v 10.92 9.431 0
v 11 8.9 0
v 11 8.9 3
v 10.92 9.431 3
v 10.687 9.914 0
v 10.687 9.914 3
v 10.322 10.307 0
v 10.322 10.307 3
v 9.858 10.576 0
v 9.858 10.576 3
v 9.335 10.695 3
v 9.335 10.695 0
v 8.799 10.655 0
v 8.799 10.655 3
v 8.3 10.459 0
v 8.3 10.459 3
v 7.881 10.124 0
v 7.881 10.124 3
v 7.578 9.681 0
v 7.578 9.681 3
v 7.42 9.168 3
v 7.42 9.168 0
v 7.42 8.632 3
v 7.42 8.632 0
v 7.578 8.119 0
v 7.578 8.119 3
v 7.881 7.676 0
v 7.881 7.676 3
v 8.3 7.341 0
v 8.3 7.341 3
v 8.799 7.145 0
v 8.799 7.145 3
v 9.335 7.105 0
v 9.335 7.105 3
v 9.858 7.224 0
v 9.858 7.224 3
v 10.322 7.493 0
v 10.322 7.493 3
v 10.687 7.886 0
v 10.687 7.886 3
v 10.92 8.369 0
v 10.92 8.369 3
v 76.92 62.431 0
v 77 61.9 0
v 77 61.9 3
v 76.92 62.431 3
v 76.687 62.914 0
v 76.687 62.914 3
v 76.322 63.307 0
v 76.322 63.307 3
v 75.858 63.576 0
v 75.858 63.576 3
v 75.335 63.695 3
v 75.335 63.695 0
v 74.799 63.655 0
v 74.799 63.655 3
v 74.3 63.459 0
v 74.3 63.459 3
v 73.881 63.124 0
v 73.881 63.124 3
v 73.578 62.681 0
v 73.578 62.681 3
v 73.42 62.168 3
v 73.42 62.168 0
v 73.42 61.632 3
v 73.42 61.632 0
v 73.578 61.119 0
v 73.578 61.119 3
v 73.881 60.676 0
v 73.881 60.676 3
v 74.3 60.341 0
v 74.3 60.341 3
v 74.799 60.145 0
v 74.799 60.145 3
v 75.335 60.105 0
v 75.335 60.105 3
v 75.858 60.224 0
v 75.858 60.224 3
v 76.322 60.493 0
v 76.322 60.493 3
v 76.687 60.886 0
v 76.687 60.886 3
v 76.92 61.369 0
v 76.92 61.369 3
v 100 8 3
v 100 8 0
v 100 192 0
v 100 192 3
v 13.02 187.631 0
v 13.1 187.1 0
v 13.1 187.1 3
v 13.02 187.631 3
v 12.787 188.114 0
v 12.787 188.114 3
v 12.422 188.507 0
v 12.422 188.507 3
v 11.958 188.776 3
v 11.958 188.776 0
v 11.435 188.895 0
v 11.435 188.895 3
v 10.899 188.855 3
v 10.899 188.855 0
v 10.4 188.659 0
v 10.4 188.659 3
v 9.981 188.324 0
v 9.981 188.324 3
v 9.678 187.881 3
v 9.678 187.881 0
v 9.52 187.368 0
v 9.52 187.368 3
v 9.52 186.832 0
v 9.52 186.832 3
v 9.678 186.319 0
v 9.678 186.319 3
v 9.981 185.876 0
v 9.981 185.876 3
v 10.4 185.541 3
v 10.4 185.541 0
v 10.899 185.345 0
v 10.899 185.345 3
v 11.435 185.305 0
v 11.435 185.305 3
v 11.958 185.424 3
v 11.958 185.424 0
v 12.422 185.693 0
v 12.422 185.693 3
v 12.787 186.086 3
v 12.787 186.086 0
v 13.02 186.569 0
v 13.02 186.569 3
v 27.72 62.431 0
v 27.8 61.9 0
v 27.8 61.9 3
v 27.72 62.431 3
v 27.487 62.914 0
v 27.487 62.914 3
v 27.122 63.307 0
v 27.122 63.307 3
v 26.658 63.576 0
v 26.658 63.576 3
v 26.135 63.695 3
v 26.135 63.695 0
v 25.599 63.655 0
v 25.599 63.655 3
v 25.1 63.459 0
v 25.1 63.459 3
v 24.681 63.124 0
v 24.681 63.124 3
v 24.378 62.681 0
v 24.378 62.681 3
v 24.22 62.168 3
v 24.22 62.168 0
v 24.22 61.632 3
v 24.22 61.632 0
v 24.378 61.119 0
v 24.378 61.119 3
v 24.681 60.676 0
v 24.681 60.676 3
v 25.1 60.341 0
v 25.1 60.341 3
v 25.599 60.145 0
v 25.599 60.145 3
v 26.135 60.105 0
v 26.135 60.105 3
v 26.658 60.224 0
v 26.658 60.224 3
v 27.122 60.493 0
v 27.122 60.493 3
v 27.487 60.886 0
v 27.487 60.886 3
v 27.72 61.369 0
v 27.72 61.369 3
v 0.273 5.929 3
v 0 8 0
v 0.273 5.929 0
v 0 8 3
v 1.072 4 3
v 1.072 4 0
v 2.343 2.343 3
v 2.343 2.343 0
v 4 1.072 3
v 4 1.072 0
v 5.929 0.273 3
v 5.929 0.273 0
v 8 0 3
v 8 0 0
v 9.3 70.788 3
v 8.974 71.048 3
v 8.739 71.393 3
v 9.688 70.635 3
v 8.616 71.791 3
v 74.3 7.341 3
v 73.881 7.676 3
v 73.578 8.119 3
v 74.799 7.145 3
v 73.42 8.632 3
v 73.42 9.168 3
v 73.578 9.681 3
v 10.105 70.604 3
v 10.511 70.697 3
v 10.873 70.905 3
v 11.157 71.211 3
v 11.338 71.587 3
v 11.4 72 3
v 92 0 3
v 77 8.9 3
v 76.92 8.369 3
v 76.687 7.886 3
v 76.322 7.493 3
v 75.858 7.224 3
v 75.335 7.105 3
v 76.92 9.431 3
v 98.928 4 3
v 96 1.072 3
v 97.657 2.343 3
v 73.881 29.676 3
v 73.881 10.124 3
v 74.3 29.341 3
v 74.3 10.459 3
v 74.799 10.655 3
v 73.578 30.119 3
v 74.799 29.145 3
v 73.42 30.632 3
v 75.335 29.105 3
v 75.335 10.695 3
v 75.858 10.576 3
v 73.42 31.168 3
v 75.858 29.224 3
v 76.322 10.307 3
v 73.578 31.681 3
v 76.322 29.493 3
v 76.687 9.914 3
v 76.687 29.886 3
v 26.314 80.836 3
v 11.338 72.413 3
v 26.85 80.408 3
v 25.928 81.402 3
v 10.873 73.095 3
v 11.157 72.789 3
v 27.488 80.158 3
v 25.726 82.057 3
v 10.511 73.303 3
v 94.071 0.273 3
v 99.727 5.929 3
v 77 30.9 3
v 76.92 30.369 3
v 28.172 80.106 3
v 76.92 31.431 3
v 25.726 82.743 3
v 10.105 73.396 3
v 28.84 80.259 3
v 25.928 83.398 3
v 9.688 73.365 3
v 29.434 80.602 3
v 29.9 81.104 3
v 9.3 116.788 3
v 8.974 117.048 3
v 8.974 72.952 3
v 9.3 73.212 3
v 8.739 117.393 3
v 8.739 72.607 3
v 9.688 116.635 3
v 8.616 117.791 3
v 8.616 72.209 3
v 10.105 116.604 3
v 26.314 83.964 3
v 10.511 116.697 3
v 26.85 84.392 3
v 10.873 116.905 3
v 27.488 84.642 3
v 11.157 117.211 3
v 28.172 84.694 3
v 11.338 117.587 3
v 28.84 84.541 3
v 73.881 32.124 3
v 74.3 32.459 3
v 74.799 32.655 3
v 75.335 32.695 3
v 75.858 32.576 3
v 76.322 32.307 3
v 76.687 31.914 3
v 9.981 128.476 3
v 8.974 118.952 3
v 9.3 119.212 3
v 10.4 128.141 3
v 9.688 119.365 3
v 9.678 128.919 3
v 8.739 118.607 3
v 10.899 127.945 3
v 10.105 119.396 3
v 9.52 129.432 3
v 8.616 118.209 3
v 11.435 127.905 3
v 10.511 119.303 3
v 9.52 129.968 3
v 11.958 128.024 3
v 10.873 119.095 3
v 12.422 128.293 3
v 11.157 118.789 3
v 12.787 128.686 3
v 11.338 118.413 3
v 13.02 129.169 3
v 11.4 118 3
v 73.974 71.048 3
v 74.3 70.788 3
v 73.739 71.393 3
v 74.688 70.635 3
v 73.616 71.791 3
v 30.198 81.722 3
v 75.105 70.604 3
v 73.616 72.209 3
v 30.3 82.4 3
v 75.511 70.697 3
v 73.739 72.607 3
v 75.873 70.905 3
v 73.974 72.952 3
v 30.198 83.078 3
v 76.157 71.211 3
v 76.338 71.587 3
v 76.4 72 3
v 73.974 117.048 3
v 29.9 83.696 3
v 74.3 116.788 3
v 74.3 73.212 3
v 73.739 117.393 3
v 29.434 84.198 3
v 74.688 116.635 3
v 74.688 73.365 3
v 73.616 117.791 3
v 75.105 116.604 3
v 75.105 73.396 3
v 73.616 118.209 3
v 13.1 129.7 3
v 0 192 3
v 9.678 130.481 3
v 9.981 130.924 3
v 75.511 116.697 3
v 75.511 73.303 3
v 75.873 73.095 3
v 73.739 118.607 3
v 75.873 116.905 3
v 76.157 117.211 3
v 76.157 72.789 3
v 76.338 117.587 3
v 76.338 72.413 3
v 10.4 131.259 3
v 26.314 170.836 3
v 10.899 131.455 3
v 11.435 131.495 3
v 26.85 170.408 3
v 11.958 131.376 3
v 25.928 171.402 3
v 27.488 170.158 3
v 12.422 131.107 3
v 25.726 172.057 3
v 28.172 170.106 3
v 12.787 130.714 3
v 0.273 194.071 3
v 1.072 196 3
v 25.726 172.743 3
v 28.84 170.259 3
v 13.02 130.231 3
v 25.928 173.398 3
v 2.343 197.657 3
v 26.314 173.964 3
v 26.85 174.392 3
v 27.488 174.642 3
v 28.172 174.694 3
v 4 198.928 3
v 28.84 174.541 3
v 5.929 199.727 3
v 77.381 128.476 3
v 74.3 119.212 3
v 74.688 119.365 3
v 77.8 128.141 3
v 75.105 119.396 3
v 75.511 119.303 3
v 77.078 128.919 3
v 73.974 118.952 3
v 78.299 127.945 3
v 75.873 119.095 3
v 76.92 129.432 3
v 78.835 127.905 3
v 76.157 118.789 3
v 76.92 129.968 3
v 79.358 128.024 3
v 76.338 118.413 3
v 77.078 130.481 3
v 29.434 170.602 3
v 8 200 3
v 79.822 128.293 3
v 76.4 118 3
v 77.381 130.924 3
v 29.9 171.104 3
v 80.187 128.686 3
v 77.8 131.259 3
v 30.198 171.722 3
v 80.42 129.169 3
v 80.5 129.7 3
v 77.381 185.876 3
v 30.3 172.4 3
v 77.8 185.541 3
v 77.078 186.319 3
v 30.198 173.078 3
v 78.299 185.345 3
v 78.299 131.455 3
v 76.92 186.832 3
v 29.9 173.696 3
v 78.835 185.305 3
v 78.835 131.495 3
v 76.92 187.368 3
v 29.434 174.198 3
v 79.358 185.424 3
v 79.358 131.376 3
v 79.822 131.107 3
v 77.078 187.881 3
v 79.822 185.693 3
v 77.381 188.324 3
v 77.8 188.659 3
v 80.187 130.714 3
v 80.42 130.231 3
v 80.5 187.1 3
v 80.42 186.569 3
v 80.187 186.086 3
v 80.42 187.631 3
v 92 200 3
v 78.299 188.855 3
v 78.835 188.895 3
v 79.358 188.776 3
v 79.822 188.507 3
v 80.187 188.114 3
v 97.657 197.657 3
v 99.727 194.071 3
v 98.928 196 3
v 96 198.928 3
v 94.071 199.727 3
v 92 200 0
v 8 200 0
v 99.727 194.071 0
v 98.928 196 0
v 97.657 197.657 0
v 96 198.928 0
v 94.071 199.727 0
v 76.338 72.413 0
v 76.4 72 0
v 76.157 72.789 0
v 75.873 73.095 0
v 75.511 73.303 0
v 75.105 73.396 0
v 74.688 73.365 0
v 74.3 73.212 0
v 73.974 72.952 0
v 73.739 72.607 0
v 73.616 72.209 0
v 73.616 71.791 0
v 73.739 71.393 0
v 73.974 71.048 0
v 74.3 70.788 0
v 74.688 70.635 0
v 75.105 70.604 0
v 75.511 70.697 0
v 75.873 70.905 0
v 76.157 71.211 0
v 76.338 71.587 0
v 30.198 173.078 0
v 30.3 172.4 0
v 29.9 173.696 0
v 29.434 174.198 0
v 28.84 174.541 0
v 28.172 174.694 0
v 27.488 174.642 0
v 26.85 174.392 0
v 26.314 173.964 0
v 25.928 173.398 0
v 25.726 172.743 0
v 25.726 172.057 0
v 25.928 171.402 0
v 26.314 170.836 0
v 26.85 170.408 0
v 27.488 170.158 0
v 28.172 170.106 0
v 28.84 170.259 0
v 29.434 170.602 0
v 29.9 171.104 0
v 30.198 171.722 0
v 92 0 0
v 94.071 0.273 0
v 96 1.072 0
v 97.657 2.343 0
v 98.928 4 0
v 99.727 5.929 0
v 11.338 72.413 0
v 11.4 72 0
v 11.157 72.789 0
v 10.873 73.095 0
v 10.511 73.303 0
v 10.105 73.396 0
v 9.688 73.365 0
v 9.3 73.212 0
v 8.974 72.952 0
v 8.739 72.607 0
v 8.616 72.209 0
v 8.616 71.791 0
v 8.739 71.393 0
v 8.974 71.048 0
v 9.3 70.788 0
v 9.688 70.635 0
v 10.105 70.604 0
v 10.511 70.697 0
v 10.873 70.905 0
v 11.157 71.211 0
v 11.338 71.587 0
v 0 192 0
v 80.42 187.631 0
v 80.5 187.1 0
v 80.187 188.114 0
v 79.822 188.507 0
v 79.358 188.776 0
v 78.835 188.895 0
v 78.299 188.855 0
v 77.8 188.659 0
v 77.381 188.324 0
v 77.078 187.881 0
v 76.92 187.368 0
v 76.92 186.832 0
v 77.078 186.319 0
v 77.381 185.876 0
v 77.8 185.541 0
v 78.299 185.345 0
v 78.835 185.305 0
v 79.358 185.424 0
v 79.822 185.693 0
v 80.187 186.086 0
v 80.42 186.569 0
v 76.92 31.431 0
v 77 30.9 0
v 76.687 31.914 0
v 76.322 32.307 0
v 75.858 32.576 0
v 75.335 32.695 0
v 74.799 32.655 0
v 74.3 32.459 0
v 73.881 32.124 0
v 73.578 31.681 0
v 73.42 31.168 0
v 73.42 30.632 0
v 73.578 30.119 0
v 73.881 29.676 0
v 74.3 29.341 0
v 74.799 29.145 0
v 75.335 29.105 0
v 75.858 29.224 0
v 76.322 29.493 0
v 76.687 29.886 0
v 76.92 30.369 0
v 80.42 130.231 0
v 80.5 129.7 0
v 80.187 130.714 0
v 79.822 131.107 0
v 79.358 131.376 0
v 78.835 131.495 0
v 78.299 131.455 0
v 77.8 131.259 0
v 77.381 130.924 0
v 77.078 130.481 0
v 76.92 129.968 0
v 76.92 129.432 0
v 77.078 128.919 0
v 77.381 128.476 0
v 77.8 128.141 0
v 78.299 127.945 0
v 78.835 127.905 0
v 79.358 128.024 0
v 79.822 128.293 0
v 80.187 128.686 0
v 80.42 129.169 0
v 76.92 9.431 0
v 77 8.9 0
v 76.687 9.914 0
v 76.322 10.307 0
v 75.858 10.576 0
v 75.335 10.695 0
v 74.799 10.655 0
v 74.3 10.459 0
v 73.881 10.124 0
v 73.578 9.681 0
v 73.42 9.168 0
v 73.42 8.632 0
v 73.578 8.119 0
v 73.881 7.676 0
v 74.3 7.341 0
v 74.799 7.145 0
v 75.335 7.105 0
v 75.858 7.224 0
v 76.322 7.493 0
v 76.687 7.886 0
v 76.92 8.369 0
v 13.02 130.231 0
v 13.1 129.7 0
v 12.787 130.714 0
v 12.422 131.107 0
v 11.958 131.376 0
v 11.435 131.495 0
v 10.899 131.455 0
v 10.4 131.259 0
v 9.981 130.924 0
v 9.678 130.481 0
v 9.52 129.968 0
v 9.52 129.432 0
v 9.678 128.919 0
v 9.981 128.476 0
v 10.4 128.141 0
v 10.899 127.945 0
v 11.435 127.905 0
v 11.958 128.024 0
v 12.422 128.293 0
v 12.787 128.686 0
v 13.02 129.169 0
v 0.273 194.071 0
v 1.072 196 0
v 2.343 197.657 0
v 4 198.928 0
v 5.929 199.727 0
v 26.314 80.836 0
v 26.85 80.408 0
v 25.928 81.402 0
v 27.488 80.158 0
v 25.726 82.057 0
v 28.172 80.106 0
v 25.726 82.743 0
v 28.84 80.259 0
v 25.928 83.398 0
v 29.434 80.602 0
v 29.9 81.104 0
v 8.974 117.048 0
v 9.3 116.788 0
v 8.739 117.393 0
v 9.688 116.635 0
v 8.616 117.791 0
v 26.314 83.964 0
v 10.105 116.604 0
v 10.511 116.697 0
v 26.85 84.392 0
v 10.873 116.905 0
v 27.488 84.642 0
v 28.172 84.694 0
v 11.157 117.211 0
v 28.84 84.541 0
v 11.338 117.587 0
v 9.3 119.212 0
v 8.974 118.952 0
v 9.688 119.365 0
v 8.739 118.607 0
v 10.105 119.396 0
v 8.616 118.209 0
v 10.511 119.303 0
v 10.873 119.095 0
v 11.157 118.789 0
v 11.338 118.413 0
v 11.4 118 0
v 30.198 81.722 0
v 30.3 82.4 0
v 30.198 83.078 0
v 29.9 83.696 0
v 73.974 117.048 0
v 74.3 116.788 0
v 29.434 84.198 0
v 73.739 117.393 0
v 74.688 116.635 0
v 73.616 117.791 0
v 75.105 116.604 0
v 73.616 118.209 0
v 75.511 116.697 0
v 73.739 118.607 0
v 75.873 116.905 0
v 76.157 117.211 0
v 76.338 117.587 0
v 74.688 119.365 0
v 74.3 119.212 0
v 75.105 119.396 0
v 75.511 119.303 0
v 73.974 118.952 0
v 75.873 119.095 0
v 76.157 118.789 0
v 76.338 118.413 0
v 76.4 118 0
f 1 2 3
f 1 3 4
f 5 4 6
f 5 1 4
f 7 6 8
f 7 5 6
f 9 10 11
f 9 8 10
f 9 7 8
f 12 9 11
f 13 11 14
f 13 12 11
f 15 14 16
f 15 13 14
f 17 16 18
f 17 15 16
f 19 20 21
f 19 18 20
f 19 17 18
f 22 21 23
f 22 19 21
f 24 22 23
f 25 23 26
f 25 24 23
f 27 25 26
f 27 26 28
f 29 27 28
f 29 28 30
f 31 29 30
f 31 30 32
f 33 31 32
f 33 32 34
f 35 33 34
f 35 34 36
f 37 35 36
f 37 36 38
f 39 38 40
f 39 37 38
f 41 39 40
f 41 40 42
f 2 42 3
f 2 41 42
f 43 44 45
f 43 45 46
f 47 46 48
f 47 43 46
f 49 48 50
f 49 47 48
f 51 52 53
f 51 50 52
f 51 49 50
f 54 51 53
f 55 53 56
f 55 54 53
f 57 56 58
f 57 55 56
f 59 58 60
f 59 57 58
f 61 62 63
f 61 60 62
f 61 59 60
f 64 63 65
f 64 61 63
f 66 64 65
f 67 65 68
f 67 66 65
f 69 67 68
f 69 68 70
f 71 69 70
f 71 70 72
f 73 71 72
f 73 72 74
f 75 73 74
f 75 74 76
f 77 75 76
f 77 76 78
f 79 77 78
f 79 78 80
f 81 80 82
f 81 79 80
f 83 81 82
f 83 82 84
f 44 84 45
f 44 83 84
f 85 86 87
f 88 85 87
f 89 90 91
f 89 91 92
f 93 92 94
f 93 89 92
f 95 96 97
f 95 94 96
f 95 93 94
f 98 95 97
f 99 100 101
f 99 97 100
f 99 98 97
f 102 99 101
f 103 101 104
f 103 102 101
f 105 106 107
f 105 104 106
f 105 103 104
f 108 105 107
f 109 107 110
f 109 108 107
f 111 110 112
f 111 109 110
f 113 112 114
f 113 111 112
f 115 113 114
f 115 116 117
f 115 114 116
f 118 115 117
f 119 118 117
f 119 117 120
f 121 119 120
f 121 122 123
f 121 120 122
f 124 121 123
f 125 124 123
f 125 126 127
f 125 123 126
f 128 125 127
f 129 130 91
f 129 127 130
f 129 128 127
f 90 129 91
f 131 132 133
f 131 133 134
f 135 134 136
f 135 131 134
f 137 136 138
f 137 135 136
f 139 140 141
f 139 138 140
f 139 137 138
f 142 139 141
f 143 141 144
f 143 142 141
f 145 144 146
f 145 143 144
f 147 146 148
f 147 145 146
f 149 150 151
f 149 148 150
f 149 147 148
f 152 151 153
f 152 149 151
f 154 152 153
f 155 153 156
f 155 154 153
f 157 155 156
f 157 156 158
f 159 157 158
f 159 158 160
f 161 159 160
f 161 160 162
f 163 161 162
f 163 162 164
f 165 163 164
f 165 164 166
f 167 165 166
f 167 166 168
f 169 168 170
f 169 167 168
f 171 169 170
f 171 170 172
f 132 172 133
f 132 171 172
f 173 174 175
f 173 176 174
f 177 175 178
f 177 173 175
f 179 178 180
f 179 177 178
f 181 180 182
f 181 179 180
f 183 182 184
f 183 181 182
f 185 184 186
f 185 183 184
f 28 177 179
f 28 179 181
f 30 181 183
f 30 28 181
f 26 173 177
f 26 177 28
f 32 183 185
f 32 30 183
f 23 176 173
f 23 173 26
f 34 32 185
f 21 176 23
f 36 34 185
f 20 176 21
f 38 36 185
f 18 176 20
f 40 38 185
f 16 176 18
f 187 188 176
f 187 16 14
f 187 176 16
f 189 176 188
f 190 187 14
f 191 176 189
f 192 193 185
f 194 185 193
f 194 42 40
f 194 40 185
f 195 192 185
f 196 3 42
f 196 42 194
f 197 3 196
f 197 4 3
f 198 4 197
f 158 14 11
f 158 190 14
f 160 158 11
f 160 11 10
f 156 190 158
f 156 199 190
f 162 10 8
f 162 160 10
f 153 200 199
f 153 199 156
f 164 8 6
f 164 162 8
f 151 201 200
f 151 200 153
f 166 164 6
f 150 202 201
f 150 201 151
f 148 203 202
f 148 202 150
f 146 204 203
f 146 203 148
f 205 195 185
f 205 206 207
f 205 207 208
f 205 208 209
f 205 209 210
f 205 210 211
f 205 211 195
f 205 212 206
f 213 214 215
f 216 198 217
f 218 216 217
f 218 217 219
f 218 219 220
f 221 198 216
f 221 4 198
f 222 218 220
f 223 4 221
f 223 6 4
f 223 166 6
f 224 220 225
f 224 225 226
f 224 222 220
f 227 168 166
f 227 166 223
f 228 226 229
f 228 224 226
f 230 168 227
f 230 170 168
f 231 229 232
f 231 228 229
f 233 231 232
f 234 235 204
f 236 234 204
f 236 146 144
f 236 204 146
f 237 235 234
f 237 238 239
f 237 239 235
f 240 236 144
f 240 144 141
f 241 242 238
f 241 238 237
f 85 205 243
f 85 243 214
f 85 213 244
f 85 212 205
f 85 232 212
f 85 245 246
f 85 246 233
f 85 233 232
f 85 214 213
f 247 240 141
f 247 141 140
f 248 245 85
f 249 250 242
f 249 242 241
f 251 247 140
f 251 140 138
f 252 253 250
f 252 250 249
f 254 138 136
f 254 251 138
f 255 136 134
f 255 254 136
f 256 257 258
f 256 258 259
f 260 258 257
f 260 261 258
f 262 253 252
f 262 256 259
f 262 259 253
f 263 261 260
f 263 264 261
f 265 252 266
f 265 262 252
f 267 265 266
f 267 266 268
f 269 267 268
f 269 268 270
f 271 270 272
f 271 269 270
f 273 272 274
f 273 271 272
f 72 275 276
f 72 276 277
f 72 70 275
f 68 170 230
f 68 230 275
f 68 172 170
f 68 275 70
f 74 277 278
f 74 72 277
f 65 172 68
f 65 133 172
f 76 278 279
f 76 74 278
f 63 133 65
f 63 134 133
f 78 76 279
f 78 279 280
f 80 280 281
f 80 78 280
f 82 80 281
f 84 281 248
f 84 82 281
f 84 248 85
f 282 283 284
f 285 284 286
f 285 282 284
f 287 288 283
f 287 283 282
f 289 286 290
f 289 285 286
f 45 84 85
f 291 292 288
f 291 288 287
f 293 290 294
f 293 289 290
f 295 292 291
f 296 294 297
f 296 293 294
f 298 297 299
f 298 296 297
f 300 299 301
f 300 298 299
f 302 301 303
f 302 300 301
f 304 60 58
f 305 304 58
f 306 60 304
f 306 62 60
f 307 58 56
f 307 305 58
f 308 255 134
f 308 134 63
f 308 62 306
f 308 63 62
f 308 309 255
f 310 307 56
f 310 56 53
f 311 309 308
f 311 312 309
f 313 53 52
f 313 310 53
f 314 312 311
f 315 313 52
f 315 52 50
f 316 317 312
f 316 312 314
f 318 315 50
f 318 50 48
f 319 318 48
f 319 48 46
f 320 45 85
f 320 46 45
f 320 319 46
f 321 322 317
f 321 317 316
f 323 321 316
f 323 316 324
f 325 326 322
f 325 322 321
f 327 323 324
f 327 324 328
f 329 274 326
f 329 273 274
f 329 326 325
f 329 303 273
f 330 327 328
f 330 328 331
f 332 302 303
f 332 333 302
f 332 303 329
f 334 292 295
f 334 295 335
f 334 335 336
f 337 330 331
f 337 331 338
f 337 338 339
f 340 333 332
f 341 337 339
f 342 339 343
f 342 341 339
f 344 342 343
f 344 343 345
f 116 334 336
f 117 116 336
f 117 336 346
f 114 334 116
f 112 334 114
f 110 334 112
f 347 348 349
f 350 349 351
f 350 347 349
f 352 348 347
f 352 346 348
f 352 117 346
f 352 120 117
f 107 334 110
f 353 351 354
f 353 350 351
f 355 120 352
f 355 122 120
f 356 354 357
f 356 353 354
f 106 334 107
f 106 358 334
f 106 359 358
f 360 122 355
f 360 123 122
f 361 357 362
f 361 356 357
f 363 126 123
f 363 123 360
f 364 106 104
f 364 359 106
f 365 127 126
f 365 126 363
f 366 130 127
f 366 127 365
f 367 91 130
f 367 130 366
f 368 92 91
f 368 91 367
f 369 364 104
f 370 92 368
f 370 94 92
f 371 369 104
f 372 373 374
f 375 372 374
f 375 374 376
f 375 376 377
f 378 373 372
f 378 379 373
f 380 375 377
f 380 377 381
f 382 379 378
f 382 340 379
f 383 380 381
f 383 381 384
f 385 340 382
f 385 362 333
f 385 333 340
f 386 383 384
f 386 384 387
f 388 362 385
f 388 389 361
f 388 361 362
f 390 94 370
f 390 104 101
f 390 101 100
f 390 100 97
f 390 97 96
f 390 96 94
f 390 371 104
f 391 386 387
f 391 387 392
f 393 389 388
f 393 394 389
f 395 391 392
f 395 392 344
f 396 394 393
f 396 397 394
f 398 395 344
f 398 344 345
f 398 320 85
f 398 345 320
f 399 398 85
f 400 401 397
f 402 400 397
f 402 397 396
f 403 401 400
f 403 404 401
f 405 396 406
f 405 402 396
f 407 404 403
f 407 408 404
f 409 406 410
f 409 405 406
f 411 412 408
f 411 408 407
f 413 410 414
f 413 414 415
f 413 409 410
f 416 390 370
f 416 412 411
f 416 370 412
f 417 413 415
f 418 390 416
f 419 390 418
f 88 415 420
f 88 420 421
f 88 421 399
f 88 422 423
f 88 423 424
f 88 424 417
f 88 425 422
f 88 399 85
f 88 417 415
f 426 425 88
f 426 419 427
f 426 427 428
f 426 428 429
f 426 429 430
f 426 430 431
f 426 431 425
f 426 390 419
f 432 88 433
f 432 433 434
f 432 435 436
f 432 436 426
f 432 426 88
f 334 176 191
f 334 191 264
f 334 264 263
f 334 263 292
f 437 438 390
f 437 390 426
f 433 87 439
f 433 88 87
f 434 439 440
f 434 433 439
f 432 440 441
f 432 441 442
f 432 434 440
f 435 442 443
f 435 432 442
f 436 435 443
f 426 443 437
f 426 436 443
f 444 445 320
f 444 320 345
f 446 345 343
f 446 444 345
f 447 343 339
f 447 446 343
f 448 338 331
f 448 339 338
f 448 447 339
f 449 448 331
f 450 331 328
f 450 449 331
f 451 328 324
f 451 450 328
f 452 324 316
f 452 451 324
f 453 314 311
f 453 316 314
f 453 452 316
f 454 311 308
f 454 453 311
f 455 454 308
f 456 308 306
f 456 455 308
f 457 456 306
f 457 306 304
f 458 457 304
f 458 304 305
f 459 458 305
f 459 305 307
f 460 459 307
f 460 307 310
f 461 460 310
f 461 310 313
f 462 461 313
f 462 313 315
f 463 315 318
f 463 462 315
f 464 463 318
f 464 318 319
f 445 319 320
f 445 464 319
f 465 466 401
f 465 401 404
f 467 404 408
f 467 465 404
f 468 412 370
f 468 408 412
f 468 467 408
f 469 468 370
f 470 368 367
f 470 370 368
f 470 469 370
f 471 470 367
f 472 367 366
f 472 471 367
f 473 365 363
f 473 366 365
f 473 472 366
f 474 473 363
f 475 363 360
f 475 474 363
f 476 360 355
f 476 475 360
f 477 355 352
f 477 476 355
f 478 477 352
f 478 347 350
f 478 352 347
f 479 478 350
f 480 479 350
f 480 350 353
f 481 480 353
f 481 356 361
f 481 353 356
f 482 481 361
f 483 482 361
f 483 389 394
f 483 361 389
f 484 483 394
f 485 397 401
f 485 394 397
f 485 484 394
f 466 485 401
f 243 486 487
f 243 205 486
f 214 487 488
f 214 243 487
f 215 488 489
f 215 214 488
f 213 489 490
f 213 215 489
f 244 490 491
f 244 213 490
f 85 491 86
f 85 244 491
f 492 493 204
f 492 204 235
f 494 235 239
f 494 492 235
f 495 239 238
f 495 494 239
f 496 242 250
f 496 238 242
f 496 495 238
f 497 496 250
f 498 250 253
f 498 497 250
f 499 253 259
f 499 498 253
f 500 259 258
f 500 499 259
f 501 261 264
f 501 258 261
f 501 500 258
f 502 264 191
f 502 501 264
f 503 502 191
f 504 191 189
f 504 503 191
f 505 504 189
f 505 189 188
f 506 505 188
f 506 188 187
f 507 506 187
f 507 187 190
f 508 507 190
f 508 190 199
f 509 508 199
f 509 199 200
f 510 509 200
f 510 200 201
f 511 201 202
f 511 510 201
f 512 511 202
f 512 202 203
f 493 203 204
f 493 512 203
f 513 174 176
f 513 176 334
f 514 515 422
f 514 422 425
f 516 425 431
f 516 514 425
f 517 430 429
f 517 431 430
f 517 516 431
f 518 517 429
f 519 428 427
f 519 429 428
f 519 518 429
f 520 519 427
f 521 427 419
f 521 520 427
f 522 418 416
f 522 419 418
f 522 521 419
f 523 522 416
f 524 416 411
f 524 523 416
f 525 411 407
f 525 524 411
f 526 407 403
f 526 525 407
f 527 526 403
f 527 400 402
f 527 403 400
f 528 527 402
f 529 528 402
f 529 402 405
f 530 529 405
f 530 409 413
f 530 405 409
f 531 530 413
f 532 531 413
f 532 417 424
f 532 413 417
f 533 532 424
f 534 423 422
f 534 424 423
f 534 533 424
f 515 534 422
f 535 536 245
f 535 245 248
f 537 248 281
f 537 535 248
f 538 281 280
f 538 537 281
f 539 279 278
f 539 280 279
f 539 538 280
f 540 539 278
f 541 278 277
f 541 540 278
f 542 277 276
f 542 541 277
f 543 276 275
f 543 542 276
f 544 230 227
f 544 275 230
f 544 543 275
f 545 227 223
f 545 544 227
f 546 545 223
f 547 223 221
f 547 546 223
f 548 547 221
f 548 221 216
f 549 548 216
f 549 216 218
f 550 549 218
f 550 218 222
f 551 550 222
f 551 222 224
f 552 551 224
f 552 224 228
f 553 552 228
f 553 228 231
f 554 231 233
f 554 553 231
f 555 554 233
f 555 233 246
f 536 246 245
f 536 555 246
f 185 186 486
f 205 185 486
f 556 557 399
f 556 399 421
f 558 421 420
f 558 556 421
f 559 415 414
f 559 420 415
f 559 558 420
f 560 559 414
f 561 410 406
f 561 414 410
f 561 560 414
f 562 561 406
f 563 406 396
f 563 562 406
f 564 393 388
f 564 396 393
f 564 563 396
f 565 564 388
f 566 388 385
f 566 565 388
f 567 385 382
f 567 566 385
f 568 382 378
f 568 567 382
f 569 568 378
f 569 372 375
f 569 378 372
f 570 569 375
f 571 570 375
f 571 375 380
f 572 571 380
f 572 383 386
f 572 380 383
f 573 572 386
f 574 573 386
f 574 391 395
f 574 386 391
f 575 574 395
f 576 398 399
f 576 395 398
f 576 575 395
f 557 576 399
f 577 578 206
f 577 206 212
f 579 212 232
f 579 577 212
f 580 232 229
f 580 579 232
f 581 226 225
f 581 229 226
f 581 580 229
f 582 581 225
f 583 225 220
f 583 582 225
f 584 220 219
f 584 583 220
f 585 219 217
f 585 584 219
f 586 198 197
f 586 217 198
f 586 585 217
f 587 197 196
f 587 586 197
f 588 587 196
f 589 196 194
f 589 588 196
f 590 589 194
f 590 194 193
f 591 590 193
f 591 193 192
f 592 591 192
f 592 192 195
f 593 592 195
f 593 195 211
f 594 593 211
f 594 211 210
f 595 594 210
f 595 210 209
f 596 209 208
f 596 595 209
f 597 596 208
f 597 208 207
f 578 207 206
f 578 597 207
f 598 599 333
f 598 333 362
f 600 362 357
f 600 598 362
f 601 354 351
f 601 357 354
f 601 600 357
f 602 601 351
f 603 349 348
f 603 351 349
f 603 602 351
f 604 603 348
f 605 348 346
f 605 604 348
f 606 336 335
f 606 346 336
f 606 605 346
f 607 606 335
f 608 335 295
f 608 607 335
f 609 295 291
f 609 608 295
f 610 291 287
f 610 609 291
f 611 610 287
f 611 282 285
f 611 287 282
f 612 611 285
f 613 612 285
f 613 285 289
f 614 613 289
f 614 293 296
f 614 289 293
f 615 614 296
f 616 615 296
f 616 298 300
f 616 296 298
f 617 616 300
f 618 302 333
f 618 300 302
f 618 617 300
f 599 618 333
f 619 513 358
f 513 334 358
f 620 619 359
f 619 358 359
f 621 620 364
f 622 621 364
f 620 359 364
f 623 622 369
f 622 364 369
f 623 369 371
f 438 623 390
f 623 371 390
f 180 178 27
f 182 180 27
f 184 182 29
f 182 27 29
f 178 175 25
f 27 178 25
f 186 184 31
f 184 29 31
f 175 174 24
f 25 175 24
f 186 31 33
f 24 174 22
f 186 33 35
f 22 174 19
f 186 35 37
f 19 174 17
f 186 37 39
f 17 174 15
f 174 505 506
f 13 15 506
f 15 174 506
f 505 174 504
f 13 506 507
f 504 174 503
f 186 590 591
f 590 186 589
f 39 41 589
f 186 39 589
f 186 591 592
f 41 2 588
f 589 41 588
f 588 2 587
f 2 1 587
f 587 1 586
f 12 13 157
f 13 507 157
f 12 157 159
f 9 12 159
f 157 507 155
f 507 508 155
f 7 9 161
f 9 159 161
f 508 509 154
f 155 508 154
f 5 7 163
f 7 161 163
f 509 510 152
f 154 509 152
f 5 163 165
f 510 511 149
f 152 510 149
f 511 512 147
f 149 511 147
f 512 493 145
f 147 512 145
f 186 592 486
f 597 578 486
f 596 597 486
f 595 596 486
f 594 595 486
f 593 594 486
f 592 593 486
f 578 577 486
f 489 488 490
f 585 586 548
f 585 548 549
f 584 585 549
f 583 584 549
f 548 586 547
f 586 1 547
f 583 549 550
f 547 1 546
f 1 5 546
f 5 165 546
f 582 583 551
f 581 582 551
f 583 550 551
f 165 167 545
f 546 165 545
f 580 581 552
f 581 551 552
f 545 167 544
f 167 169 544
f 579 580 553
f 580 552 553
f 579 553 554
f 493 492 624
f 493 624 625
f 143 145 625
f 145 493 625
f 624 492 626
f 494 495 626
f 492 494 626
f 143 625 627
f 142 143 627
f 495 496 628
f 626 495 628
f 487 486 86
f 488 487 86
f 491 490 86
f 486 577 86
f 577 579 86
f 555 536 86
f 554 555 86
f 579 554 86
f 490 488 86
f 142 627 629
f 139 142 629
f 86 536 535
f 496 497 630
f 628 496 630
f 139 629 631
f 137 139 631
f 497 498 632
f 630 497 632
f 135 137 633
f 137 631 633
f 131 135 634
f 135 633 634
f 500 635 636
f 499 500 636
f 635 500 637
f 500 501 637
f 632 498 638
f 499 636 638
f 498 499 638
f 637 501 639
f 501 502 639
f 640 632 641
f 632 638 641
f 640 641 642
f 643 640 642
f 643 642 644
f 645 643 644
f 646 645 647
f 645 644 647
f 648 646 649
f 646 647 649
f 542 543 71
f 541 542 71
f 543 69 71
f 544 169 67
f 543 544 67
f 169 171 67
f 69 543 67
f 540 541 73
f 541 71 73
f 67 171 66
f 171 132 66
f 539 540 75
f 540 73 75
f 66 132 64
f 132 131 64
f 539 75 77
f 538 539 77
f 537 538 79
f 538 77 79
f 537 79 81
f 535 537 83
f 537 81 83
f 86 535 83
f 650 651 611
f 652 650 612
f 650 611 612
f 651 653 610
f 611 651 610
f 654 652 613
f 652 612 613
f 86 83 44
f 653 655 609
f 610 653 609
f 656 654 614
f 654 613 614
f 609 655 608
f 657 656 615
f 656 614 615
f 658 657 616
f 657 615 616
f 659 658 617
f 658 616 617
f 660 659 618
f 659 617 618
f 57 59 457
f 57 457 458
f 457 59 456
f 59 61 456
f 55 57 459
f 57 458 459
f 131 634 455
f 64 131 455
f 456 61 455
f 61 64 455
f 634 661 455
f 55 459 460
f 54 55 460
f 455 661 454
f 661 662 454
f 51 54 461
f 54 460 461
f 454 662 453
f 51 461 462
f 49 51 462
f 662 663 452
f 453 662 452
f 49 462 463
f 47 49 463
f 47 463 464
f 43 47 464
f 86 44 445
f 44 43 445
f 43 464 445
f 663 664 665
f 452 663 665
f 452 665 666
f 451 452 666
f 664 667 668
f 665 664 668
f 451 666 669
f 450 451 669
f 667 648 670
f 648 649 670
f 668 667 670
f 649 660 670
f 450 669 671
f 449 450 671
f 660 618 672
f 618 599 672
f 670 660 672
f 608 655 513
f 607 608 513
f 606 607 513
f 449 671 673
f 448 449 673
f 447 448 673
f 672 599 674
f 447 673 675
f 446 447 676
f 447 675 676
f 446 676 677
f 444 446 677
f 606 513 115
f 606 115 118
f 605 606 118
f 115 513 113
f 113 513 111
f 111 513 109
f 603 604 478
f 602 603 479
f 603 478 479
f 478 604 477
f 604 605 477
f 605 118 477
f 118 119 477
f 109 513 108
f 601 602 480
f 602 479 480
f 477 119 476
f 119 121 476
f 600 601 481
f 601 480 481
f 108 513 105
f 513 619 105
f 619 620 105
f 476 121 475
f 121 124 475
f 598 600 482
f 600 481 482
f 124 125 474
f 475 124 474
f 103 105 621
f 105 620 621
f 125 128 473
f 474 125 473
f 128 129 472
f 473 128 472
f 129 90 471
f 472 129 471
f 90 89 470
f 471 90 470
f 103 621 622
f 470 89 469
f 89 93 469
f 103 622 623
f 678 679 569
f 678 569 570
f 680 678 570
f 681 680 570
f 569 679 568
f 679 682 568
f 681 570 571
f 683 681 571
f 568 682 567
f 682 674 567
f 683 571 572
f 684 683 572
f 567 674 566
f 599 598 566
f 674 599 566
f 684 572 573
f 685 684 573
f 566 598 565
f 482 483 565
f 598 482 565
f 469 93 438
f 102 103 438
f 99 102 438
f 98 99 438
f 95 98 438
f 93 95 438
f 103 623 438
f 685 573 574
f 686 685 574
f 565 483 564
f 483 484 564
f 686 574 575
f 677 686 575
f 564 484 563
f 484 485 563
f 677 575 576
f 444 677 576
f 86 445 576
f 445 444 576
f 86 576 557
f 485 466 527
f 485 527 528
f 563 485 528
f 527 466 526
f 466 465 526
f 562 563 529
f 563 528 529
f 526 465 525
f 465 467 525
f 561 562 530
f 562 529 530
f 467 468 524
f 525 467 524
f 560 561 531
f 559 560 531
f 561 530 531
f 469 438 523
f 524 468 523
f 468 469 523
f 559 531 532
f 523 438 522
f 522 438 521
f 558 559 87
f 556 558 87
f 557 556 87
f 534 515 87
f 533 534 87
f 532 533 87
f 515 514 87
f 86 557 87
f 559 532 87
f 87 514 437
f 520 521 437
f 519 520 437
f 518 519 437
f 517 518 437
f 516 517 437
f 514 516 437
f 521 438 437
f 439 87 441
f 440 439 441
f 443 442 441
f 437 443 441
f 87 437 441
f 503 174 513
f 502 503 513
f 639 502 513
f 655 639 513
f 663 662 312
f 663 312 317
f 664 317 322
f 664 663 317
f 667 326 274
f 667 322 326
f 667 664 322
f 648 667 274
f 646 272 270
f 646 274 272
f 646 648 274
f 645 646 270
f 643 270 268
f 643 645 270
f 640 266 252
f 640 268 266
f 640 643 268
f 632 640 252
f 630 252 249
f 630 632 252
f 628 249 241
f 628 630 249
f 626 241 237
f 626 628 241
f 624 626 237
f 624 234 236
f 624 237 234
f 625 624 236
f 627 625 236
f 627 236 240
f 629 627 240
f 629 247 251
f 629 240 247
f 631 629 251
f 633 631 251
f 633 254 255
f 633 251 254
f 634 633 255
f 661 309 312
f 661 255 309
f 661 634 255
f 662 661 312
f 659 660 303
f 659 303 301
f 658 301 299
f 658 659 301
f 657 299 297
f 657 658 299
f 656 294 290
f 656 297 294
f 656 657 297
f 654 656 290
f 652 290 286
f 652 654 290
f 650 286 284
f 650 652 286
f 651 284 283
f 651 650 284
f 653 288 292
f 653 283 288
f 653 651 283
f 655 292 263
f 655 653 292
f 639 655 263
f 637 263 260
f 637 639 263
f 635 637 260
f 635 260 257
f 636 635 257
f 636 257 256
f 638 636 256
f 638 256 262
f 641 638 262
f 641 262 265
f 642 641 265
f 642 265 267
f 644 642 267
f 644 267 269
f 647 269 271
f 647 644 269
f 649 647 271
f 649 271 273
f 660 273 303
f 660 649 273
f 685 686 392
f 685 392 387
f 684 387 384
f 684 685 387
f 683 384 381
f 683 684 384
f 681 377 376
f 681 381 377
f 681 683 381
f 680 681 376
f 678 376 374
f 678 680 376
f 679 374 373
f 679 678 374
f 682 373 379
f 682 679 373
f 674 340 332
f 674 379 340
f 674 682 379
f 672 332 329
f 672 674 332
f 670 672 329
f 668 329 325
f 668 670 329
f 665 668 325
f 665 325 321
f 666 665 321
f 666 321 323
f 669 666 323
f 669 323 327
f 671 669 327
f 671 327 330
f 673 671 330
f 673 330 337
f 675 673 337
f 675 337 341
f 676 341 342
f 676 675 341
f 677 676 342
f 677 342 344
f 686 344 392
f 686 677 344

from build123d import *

# Parameters (mm, degrees)
CYLINDER_R        = 1.8
CYLINDER_DEPTH    = 10
CYLINDER002_R     = 2.3
CYLINDER002_DEPTH = 20
ARRAY001_Y_COUNT  = 2
ARRAY001_Y_PITCH  = 90
CYLINDER001_R     = 1.4
CYLINDER001_DEPTH = 10
ARRAY_X_COUNT     = 2
ARRAY_X_PITCH     = 65
ARRAY_Y_COUNT     = 2
ARRAY_Y_PITCH     = 46
CYLINDER011_R     = 1.8
CYLINDER011_DEPTH = 20
ARRAY007_X_COUNT  = 2
ARRAY007_X_PITCH  = 67.4
ARRAY007_Y_COUNT  = 2
ARRAY007_Y_PITCH  = 57.4
BOX_W             = 100
BOX_H             = 200
BOX_DEPTH         = 3
FILLET_R          = 8


with BuildPart() as m3_bolt_hole:
    # Cylinder → Cylinder (new body)
    with BuildSketch(Plane.XY):
        Circle(CYLINDER_R)
    extrude(amount=CYLINDER_DEPTH)


with BuildPart() as m3_bolt_hole_clone003:
    # Body003 base: copy of m3 bolt hole
    add(m3_bolt_hole.part)


with BuildPart() as m3_bolt_hole_clone003_1:
    # Body003 placement: moved
    add(m3_bolt_hole_clone003.part.moved(Location((30.2, -3.5, 0))))


with BuildPart() as m3_bolt_hole_clone002:
    # Body002 base: copy of m3 bolt hole
    add(m3_bolt_hole.part)


with BuildPart() as m3_bolt_hole_clone002_1:
    # Body002 placement: moved
    add(m3_bolt_hole_clone002.part.moved(Location((30.2, 27.5, 0))))


with BuildPart() as m3_bolt_hole_clone001:
    # Body001 base: copy of m3 bolt hole
    add(m3_bolt_hole.part)


with BuildPart() as m3_bolt_hole_clone001_1:
    # Body001 placement: moved
    add(m3_bolt_hole_clone001.part.moved(Location((-35.8, -25.5, 0))))


with BuildPart() as m3_bolt_hole_clone:
    # Body base: copy of m3 bolt hole
    add(m3_bolt_hole.part)


with BuildPart() as m3_bolt_hole_clone_1:
    # Body placement: moved
    add(m3_bolt_hole_clone.part.moved(Location((-19, 27.5, 0))))


with BuildPart() as attach_m4_bolt_array:
    # Cylinder002 → Cylinder002 (new body)
    with BuildSketch(Plane.XY):
        Circle(CYLINDER002_R)
    extrude(amount=CYLINDER002_DEPTH)

    # Array001 Y: attach m4 bolt array ×2


with BuildPart() as attach_m4_bolt_array_1:
    add(attach_m4_bolt_array.part)
    with Locations(*[(0, i * ARRAY001_Y_PITCH, 0) for i in range(1, ARRAY001_Y_COUNT)]):
        add(attach_m4_bolt_array.part)


with BuildPart() as attach_m4_bolt_array_2:
    # Array001 placement: moved
    add(attach_m4_bolt_array_1.part.moved(Location((-17, 48, -6))))


with BuildPart() as m2_5_bolt_hole_7x5_pcb_array:
    # Cylinder001 → Cylinder001 (new body)
    with BuildSketch(Plane.XY):
        Circle(CYLINDER001_R)
    extrude(amount=CYLINDER001_DEPTH)

    # Array X: m2.5 bolt hole 7x5 pcb array ×2


with BuildPart() as m2_5_bolt_hole_7x5_pcb_array_1:
    add(m2_5_bolt_hole_7x5_pcb_array.part)
    with Locations(*[(i * ARRAY_X_PITCH, 0, 0) for i in range(1, ARRAY_X_COUNT)]):
        add(m2_5_bolt_hole_7x5_pcb_array.part)

    # Array Y: m2.5 bolt hole 7x5 pcb array ×2


with BuildPart() as m2_5_bolt_hole_7x5_pcb_array_2:
    add(m2_5_bolt_hole_7x5_pcb_array_1.part)
    with Locations(*[(0, i * ARRAY_Y_PITCH, 0) for i in range(1, ARRAY_Y_COUNT)]):
        add(m2_5_bolt_hole_7x5_pcb_array_1.part)


with BuildPart() as m2_5_bolt_hole_7x5_pcb_array_3:
    # Array placement: moved
    add(m2_5_bolt_hole_7x5_pcb_array_2.part.moved(Location((-35, 37.6, 0))))


with BuildPart() as wall_box_hole_stand_array002:
    # Cylinder011 → Cylinder011 (new body)
    with BuildSketch(Plane(origin=(3.3, 3.3, 0), x_dir=(1, 0, 0), z_dir=(0, 0, 1))):
        Circle(CYLINDER011_R)
    extrude(amount=CYLINDER011_DEPTH)

    # Array007 X: wall box hole stand array002 ×2


with BuildPart() as wall_box_hole_stand_array002_1:
    add(wall_box_hole_stand_array002.part)
    with Locations(*[(i * ARRAY007_X_PITCH, 0, 0) for i in range(1, ARRAY007_X_COUNT)]):
        add(wall_box_hole_stand_array002.part)

    # Array007 Y: wall box hole stand array002 ×2


with BuildPart() as wall_box_hole_stand_array002_2:
    add(wall_box_hole_stand_array002_1.part)
    with Locations(*[(0, i * ARRAY007_Y_PITCH, 0) for i in range(1, ARRAY007_Y_COUNT)]):
        add(wall_box_hole_stand_array002_1.part)


with BuildPart() as wall_box_hole_stand_array002_3:
    # Array007 placement: moved
    add(wall_box_hole_stand_array002_2.part.moved(Location((-37, 92, -6))))


with BuildPart() as cnc_v4_m3_hole_fusion:
    # Body004 base: copy of m3 bolt hole
    add(m3_bolt_hole.part)


with BuildPart() as cnc_v4_m3_hole_fusion_1:
    # Body004 placement: moved
    add(cnc_v4_m3_hole_fusion.part.moved(Location((30.2, -25.5, 0))))

    # Fusion: union m3 bolt hole clone003, m3 bolt hole clone002, m3 bolt hole clone001, m3 bolt hole clone, attach m4 bolt array, m2.5 bolt hole 7x5 pcb array, wall box hole stand array002
    add(m3_bolt_hole_clone003_1.part)
    add(m3_bolt_hole_clone002_1.part)
    add(m3_bolt_hole_clone001_1.part)
    add(m3_bolt_hole_clone_1.part)
    add(attach_m4_bolt_array_2.part)
    add(m2_5_bolt_hole_7x5_pcb_array_3.part)
    add(wall_box_hole_stand_array002_3.part)


with BuildPart() as cnc_v4_m3_hole_fusion_2:
    # Fusion placement: moved
    add(cnc_v4_m3_hole_fusion_1.part.moved(Location((45, 34.4, -2.25))))


with BuildPart() as cnc_v4_plate_cut:
    # Box → Box (new body)
    with BuildSketch(Plane.XY):
        with Locations((50, 100)):
            Rectangle(BOX_W, BOX_H)
    extrude(amount=BOX_DEPTH)

    # Fillet
    fillet_edges = [cnc_v4_plate_cut.edges().sort_by_distance(p)[0] for p in [
        (0, 0, 1.5),
        (0, 200, 1.5),
        (100, 0, 1.5),
        (100, 200, 1.5),
    ]]
    fillet(fillet_edges, radius=FILLET_R)

    # Cut008: cut cnc v4 m3 hole fusion
    add(cnc_v4_m3_hole_fusion_2.part, mode=Mode.SUBTRACT)


solid = cnc_v4_plate_cut.part
